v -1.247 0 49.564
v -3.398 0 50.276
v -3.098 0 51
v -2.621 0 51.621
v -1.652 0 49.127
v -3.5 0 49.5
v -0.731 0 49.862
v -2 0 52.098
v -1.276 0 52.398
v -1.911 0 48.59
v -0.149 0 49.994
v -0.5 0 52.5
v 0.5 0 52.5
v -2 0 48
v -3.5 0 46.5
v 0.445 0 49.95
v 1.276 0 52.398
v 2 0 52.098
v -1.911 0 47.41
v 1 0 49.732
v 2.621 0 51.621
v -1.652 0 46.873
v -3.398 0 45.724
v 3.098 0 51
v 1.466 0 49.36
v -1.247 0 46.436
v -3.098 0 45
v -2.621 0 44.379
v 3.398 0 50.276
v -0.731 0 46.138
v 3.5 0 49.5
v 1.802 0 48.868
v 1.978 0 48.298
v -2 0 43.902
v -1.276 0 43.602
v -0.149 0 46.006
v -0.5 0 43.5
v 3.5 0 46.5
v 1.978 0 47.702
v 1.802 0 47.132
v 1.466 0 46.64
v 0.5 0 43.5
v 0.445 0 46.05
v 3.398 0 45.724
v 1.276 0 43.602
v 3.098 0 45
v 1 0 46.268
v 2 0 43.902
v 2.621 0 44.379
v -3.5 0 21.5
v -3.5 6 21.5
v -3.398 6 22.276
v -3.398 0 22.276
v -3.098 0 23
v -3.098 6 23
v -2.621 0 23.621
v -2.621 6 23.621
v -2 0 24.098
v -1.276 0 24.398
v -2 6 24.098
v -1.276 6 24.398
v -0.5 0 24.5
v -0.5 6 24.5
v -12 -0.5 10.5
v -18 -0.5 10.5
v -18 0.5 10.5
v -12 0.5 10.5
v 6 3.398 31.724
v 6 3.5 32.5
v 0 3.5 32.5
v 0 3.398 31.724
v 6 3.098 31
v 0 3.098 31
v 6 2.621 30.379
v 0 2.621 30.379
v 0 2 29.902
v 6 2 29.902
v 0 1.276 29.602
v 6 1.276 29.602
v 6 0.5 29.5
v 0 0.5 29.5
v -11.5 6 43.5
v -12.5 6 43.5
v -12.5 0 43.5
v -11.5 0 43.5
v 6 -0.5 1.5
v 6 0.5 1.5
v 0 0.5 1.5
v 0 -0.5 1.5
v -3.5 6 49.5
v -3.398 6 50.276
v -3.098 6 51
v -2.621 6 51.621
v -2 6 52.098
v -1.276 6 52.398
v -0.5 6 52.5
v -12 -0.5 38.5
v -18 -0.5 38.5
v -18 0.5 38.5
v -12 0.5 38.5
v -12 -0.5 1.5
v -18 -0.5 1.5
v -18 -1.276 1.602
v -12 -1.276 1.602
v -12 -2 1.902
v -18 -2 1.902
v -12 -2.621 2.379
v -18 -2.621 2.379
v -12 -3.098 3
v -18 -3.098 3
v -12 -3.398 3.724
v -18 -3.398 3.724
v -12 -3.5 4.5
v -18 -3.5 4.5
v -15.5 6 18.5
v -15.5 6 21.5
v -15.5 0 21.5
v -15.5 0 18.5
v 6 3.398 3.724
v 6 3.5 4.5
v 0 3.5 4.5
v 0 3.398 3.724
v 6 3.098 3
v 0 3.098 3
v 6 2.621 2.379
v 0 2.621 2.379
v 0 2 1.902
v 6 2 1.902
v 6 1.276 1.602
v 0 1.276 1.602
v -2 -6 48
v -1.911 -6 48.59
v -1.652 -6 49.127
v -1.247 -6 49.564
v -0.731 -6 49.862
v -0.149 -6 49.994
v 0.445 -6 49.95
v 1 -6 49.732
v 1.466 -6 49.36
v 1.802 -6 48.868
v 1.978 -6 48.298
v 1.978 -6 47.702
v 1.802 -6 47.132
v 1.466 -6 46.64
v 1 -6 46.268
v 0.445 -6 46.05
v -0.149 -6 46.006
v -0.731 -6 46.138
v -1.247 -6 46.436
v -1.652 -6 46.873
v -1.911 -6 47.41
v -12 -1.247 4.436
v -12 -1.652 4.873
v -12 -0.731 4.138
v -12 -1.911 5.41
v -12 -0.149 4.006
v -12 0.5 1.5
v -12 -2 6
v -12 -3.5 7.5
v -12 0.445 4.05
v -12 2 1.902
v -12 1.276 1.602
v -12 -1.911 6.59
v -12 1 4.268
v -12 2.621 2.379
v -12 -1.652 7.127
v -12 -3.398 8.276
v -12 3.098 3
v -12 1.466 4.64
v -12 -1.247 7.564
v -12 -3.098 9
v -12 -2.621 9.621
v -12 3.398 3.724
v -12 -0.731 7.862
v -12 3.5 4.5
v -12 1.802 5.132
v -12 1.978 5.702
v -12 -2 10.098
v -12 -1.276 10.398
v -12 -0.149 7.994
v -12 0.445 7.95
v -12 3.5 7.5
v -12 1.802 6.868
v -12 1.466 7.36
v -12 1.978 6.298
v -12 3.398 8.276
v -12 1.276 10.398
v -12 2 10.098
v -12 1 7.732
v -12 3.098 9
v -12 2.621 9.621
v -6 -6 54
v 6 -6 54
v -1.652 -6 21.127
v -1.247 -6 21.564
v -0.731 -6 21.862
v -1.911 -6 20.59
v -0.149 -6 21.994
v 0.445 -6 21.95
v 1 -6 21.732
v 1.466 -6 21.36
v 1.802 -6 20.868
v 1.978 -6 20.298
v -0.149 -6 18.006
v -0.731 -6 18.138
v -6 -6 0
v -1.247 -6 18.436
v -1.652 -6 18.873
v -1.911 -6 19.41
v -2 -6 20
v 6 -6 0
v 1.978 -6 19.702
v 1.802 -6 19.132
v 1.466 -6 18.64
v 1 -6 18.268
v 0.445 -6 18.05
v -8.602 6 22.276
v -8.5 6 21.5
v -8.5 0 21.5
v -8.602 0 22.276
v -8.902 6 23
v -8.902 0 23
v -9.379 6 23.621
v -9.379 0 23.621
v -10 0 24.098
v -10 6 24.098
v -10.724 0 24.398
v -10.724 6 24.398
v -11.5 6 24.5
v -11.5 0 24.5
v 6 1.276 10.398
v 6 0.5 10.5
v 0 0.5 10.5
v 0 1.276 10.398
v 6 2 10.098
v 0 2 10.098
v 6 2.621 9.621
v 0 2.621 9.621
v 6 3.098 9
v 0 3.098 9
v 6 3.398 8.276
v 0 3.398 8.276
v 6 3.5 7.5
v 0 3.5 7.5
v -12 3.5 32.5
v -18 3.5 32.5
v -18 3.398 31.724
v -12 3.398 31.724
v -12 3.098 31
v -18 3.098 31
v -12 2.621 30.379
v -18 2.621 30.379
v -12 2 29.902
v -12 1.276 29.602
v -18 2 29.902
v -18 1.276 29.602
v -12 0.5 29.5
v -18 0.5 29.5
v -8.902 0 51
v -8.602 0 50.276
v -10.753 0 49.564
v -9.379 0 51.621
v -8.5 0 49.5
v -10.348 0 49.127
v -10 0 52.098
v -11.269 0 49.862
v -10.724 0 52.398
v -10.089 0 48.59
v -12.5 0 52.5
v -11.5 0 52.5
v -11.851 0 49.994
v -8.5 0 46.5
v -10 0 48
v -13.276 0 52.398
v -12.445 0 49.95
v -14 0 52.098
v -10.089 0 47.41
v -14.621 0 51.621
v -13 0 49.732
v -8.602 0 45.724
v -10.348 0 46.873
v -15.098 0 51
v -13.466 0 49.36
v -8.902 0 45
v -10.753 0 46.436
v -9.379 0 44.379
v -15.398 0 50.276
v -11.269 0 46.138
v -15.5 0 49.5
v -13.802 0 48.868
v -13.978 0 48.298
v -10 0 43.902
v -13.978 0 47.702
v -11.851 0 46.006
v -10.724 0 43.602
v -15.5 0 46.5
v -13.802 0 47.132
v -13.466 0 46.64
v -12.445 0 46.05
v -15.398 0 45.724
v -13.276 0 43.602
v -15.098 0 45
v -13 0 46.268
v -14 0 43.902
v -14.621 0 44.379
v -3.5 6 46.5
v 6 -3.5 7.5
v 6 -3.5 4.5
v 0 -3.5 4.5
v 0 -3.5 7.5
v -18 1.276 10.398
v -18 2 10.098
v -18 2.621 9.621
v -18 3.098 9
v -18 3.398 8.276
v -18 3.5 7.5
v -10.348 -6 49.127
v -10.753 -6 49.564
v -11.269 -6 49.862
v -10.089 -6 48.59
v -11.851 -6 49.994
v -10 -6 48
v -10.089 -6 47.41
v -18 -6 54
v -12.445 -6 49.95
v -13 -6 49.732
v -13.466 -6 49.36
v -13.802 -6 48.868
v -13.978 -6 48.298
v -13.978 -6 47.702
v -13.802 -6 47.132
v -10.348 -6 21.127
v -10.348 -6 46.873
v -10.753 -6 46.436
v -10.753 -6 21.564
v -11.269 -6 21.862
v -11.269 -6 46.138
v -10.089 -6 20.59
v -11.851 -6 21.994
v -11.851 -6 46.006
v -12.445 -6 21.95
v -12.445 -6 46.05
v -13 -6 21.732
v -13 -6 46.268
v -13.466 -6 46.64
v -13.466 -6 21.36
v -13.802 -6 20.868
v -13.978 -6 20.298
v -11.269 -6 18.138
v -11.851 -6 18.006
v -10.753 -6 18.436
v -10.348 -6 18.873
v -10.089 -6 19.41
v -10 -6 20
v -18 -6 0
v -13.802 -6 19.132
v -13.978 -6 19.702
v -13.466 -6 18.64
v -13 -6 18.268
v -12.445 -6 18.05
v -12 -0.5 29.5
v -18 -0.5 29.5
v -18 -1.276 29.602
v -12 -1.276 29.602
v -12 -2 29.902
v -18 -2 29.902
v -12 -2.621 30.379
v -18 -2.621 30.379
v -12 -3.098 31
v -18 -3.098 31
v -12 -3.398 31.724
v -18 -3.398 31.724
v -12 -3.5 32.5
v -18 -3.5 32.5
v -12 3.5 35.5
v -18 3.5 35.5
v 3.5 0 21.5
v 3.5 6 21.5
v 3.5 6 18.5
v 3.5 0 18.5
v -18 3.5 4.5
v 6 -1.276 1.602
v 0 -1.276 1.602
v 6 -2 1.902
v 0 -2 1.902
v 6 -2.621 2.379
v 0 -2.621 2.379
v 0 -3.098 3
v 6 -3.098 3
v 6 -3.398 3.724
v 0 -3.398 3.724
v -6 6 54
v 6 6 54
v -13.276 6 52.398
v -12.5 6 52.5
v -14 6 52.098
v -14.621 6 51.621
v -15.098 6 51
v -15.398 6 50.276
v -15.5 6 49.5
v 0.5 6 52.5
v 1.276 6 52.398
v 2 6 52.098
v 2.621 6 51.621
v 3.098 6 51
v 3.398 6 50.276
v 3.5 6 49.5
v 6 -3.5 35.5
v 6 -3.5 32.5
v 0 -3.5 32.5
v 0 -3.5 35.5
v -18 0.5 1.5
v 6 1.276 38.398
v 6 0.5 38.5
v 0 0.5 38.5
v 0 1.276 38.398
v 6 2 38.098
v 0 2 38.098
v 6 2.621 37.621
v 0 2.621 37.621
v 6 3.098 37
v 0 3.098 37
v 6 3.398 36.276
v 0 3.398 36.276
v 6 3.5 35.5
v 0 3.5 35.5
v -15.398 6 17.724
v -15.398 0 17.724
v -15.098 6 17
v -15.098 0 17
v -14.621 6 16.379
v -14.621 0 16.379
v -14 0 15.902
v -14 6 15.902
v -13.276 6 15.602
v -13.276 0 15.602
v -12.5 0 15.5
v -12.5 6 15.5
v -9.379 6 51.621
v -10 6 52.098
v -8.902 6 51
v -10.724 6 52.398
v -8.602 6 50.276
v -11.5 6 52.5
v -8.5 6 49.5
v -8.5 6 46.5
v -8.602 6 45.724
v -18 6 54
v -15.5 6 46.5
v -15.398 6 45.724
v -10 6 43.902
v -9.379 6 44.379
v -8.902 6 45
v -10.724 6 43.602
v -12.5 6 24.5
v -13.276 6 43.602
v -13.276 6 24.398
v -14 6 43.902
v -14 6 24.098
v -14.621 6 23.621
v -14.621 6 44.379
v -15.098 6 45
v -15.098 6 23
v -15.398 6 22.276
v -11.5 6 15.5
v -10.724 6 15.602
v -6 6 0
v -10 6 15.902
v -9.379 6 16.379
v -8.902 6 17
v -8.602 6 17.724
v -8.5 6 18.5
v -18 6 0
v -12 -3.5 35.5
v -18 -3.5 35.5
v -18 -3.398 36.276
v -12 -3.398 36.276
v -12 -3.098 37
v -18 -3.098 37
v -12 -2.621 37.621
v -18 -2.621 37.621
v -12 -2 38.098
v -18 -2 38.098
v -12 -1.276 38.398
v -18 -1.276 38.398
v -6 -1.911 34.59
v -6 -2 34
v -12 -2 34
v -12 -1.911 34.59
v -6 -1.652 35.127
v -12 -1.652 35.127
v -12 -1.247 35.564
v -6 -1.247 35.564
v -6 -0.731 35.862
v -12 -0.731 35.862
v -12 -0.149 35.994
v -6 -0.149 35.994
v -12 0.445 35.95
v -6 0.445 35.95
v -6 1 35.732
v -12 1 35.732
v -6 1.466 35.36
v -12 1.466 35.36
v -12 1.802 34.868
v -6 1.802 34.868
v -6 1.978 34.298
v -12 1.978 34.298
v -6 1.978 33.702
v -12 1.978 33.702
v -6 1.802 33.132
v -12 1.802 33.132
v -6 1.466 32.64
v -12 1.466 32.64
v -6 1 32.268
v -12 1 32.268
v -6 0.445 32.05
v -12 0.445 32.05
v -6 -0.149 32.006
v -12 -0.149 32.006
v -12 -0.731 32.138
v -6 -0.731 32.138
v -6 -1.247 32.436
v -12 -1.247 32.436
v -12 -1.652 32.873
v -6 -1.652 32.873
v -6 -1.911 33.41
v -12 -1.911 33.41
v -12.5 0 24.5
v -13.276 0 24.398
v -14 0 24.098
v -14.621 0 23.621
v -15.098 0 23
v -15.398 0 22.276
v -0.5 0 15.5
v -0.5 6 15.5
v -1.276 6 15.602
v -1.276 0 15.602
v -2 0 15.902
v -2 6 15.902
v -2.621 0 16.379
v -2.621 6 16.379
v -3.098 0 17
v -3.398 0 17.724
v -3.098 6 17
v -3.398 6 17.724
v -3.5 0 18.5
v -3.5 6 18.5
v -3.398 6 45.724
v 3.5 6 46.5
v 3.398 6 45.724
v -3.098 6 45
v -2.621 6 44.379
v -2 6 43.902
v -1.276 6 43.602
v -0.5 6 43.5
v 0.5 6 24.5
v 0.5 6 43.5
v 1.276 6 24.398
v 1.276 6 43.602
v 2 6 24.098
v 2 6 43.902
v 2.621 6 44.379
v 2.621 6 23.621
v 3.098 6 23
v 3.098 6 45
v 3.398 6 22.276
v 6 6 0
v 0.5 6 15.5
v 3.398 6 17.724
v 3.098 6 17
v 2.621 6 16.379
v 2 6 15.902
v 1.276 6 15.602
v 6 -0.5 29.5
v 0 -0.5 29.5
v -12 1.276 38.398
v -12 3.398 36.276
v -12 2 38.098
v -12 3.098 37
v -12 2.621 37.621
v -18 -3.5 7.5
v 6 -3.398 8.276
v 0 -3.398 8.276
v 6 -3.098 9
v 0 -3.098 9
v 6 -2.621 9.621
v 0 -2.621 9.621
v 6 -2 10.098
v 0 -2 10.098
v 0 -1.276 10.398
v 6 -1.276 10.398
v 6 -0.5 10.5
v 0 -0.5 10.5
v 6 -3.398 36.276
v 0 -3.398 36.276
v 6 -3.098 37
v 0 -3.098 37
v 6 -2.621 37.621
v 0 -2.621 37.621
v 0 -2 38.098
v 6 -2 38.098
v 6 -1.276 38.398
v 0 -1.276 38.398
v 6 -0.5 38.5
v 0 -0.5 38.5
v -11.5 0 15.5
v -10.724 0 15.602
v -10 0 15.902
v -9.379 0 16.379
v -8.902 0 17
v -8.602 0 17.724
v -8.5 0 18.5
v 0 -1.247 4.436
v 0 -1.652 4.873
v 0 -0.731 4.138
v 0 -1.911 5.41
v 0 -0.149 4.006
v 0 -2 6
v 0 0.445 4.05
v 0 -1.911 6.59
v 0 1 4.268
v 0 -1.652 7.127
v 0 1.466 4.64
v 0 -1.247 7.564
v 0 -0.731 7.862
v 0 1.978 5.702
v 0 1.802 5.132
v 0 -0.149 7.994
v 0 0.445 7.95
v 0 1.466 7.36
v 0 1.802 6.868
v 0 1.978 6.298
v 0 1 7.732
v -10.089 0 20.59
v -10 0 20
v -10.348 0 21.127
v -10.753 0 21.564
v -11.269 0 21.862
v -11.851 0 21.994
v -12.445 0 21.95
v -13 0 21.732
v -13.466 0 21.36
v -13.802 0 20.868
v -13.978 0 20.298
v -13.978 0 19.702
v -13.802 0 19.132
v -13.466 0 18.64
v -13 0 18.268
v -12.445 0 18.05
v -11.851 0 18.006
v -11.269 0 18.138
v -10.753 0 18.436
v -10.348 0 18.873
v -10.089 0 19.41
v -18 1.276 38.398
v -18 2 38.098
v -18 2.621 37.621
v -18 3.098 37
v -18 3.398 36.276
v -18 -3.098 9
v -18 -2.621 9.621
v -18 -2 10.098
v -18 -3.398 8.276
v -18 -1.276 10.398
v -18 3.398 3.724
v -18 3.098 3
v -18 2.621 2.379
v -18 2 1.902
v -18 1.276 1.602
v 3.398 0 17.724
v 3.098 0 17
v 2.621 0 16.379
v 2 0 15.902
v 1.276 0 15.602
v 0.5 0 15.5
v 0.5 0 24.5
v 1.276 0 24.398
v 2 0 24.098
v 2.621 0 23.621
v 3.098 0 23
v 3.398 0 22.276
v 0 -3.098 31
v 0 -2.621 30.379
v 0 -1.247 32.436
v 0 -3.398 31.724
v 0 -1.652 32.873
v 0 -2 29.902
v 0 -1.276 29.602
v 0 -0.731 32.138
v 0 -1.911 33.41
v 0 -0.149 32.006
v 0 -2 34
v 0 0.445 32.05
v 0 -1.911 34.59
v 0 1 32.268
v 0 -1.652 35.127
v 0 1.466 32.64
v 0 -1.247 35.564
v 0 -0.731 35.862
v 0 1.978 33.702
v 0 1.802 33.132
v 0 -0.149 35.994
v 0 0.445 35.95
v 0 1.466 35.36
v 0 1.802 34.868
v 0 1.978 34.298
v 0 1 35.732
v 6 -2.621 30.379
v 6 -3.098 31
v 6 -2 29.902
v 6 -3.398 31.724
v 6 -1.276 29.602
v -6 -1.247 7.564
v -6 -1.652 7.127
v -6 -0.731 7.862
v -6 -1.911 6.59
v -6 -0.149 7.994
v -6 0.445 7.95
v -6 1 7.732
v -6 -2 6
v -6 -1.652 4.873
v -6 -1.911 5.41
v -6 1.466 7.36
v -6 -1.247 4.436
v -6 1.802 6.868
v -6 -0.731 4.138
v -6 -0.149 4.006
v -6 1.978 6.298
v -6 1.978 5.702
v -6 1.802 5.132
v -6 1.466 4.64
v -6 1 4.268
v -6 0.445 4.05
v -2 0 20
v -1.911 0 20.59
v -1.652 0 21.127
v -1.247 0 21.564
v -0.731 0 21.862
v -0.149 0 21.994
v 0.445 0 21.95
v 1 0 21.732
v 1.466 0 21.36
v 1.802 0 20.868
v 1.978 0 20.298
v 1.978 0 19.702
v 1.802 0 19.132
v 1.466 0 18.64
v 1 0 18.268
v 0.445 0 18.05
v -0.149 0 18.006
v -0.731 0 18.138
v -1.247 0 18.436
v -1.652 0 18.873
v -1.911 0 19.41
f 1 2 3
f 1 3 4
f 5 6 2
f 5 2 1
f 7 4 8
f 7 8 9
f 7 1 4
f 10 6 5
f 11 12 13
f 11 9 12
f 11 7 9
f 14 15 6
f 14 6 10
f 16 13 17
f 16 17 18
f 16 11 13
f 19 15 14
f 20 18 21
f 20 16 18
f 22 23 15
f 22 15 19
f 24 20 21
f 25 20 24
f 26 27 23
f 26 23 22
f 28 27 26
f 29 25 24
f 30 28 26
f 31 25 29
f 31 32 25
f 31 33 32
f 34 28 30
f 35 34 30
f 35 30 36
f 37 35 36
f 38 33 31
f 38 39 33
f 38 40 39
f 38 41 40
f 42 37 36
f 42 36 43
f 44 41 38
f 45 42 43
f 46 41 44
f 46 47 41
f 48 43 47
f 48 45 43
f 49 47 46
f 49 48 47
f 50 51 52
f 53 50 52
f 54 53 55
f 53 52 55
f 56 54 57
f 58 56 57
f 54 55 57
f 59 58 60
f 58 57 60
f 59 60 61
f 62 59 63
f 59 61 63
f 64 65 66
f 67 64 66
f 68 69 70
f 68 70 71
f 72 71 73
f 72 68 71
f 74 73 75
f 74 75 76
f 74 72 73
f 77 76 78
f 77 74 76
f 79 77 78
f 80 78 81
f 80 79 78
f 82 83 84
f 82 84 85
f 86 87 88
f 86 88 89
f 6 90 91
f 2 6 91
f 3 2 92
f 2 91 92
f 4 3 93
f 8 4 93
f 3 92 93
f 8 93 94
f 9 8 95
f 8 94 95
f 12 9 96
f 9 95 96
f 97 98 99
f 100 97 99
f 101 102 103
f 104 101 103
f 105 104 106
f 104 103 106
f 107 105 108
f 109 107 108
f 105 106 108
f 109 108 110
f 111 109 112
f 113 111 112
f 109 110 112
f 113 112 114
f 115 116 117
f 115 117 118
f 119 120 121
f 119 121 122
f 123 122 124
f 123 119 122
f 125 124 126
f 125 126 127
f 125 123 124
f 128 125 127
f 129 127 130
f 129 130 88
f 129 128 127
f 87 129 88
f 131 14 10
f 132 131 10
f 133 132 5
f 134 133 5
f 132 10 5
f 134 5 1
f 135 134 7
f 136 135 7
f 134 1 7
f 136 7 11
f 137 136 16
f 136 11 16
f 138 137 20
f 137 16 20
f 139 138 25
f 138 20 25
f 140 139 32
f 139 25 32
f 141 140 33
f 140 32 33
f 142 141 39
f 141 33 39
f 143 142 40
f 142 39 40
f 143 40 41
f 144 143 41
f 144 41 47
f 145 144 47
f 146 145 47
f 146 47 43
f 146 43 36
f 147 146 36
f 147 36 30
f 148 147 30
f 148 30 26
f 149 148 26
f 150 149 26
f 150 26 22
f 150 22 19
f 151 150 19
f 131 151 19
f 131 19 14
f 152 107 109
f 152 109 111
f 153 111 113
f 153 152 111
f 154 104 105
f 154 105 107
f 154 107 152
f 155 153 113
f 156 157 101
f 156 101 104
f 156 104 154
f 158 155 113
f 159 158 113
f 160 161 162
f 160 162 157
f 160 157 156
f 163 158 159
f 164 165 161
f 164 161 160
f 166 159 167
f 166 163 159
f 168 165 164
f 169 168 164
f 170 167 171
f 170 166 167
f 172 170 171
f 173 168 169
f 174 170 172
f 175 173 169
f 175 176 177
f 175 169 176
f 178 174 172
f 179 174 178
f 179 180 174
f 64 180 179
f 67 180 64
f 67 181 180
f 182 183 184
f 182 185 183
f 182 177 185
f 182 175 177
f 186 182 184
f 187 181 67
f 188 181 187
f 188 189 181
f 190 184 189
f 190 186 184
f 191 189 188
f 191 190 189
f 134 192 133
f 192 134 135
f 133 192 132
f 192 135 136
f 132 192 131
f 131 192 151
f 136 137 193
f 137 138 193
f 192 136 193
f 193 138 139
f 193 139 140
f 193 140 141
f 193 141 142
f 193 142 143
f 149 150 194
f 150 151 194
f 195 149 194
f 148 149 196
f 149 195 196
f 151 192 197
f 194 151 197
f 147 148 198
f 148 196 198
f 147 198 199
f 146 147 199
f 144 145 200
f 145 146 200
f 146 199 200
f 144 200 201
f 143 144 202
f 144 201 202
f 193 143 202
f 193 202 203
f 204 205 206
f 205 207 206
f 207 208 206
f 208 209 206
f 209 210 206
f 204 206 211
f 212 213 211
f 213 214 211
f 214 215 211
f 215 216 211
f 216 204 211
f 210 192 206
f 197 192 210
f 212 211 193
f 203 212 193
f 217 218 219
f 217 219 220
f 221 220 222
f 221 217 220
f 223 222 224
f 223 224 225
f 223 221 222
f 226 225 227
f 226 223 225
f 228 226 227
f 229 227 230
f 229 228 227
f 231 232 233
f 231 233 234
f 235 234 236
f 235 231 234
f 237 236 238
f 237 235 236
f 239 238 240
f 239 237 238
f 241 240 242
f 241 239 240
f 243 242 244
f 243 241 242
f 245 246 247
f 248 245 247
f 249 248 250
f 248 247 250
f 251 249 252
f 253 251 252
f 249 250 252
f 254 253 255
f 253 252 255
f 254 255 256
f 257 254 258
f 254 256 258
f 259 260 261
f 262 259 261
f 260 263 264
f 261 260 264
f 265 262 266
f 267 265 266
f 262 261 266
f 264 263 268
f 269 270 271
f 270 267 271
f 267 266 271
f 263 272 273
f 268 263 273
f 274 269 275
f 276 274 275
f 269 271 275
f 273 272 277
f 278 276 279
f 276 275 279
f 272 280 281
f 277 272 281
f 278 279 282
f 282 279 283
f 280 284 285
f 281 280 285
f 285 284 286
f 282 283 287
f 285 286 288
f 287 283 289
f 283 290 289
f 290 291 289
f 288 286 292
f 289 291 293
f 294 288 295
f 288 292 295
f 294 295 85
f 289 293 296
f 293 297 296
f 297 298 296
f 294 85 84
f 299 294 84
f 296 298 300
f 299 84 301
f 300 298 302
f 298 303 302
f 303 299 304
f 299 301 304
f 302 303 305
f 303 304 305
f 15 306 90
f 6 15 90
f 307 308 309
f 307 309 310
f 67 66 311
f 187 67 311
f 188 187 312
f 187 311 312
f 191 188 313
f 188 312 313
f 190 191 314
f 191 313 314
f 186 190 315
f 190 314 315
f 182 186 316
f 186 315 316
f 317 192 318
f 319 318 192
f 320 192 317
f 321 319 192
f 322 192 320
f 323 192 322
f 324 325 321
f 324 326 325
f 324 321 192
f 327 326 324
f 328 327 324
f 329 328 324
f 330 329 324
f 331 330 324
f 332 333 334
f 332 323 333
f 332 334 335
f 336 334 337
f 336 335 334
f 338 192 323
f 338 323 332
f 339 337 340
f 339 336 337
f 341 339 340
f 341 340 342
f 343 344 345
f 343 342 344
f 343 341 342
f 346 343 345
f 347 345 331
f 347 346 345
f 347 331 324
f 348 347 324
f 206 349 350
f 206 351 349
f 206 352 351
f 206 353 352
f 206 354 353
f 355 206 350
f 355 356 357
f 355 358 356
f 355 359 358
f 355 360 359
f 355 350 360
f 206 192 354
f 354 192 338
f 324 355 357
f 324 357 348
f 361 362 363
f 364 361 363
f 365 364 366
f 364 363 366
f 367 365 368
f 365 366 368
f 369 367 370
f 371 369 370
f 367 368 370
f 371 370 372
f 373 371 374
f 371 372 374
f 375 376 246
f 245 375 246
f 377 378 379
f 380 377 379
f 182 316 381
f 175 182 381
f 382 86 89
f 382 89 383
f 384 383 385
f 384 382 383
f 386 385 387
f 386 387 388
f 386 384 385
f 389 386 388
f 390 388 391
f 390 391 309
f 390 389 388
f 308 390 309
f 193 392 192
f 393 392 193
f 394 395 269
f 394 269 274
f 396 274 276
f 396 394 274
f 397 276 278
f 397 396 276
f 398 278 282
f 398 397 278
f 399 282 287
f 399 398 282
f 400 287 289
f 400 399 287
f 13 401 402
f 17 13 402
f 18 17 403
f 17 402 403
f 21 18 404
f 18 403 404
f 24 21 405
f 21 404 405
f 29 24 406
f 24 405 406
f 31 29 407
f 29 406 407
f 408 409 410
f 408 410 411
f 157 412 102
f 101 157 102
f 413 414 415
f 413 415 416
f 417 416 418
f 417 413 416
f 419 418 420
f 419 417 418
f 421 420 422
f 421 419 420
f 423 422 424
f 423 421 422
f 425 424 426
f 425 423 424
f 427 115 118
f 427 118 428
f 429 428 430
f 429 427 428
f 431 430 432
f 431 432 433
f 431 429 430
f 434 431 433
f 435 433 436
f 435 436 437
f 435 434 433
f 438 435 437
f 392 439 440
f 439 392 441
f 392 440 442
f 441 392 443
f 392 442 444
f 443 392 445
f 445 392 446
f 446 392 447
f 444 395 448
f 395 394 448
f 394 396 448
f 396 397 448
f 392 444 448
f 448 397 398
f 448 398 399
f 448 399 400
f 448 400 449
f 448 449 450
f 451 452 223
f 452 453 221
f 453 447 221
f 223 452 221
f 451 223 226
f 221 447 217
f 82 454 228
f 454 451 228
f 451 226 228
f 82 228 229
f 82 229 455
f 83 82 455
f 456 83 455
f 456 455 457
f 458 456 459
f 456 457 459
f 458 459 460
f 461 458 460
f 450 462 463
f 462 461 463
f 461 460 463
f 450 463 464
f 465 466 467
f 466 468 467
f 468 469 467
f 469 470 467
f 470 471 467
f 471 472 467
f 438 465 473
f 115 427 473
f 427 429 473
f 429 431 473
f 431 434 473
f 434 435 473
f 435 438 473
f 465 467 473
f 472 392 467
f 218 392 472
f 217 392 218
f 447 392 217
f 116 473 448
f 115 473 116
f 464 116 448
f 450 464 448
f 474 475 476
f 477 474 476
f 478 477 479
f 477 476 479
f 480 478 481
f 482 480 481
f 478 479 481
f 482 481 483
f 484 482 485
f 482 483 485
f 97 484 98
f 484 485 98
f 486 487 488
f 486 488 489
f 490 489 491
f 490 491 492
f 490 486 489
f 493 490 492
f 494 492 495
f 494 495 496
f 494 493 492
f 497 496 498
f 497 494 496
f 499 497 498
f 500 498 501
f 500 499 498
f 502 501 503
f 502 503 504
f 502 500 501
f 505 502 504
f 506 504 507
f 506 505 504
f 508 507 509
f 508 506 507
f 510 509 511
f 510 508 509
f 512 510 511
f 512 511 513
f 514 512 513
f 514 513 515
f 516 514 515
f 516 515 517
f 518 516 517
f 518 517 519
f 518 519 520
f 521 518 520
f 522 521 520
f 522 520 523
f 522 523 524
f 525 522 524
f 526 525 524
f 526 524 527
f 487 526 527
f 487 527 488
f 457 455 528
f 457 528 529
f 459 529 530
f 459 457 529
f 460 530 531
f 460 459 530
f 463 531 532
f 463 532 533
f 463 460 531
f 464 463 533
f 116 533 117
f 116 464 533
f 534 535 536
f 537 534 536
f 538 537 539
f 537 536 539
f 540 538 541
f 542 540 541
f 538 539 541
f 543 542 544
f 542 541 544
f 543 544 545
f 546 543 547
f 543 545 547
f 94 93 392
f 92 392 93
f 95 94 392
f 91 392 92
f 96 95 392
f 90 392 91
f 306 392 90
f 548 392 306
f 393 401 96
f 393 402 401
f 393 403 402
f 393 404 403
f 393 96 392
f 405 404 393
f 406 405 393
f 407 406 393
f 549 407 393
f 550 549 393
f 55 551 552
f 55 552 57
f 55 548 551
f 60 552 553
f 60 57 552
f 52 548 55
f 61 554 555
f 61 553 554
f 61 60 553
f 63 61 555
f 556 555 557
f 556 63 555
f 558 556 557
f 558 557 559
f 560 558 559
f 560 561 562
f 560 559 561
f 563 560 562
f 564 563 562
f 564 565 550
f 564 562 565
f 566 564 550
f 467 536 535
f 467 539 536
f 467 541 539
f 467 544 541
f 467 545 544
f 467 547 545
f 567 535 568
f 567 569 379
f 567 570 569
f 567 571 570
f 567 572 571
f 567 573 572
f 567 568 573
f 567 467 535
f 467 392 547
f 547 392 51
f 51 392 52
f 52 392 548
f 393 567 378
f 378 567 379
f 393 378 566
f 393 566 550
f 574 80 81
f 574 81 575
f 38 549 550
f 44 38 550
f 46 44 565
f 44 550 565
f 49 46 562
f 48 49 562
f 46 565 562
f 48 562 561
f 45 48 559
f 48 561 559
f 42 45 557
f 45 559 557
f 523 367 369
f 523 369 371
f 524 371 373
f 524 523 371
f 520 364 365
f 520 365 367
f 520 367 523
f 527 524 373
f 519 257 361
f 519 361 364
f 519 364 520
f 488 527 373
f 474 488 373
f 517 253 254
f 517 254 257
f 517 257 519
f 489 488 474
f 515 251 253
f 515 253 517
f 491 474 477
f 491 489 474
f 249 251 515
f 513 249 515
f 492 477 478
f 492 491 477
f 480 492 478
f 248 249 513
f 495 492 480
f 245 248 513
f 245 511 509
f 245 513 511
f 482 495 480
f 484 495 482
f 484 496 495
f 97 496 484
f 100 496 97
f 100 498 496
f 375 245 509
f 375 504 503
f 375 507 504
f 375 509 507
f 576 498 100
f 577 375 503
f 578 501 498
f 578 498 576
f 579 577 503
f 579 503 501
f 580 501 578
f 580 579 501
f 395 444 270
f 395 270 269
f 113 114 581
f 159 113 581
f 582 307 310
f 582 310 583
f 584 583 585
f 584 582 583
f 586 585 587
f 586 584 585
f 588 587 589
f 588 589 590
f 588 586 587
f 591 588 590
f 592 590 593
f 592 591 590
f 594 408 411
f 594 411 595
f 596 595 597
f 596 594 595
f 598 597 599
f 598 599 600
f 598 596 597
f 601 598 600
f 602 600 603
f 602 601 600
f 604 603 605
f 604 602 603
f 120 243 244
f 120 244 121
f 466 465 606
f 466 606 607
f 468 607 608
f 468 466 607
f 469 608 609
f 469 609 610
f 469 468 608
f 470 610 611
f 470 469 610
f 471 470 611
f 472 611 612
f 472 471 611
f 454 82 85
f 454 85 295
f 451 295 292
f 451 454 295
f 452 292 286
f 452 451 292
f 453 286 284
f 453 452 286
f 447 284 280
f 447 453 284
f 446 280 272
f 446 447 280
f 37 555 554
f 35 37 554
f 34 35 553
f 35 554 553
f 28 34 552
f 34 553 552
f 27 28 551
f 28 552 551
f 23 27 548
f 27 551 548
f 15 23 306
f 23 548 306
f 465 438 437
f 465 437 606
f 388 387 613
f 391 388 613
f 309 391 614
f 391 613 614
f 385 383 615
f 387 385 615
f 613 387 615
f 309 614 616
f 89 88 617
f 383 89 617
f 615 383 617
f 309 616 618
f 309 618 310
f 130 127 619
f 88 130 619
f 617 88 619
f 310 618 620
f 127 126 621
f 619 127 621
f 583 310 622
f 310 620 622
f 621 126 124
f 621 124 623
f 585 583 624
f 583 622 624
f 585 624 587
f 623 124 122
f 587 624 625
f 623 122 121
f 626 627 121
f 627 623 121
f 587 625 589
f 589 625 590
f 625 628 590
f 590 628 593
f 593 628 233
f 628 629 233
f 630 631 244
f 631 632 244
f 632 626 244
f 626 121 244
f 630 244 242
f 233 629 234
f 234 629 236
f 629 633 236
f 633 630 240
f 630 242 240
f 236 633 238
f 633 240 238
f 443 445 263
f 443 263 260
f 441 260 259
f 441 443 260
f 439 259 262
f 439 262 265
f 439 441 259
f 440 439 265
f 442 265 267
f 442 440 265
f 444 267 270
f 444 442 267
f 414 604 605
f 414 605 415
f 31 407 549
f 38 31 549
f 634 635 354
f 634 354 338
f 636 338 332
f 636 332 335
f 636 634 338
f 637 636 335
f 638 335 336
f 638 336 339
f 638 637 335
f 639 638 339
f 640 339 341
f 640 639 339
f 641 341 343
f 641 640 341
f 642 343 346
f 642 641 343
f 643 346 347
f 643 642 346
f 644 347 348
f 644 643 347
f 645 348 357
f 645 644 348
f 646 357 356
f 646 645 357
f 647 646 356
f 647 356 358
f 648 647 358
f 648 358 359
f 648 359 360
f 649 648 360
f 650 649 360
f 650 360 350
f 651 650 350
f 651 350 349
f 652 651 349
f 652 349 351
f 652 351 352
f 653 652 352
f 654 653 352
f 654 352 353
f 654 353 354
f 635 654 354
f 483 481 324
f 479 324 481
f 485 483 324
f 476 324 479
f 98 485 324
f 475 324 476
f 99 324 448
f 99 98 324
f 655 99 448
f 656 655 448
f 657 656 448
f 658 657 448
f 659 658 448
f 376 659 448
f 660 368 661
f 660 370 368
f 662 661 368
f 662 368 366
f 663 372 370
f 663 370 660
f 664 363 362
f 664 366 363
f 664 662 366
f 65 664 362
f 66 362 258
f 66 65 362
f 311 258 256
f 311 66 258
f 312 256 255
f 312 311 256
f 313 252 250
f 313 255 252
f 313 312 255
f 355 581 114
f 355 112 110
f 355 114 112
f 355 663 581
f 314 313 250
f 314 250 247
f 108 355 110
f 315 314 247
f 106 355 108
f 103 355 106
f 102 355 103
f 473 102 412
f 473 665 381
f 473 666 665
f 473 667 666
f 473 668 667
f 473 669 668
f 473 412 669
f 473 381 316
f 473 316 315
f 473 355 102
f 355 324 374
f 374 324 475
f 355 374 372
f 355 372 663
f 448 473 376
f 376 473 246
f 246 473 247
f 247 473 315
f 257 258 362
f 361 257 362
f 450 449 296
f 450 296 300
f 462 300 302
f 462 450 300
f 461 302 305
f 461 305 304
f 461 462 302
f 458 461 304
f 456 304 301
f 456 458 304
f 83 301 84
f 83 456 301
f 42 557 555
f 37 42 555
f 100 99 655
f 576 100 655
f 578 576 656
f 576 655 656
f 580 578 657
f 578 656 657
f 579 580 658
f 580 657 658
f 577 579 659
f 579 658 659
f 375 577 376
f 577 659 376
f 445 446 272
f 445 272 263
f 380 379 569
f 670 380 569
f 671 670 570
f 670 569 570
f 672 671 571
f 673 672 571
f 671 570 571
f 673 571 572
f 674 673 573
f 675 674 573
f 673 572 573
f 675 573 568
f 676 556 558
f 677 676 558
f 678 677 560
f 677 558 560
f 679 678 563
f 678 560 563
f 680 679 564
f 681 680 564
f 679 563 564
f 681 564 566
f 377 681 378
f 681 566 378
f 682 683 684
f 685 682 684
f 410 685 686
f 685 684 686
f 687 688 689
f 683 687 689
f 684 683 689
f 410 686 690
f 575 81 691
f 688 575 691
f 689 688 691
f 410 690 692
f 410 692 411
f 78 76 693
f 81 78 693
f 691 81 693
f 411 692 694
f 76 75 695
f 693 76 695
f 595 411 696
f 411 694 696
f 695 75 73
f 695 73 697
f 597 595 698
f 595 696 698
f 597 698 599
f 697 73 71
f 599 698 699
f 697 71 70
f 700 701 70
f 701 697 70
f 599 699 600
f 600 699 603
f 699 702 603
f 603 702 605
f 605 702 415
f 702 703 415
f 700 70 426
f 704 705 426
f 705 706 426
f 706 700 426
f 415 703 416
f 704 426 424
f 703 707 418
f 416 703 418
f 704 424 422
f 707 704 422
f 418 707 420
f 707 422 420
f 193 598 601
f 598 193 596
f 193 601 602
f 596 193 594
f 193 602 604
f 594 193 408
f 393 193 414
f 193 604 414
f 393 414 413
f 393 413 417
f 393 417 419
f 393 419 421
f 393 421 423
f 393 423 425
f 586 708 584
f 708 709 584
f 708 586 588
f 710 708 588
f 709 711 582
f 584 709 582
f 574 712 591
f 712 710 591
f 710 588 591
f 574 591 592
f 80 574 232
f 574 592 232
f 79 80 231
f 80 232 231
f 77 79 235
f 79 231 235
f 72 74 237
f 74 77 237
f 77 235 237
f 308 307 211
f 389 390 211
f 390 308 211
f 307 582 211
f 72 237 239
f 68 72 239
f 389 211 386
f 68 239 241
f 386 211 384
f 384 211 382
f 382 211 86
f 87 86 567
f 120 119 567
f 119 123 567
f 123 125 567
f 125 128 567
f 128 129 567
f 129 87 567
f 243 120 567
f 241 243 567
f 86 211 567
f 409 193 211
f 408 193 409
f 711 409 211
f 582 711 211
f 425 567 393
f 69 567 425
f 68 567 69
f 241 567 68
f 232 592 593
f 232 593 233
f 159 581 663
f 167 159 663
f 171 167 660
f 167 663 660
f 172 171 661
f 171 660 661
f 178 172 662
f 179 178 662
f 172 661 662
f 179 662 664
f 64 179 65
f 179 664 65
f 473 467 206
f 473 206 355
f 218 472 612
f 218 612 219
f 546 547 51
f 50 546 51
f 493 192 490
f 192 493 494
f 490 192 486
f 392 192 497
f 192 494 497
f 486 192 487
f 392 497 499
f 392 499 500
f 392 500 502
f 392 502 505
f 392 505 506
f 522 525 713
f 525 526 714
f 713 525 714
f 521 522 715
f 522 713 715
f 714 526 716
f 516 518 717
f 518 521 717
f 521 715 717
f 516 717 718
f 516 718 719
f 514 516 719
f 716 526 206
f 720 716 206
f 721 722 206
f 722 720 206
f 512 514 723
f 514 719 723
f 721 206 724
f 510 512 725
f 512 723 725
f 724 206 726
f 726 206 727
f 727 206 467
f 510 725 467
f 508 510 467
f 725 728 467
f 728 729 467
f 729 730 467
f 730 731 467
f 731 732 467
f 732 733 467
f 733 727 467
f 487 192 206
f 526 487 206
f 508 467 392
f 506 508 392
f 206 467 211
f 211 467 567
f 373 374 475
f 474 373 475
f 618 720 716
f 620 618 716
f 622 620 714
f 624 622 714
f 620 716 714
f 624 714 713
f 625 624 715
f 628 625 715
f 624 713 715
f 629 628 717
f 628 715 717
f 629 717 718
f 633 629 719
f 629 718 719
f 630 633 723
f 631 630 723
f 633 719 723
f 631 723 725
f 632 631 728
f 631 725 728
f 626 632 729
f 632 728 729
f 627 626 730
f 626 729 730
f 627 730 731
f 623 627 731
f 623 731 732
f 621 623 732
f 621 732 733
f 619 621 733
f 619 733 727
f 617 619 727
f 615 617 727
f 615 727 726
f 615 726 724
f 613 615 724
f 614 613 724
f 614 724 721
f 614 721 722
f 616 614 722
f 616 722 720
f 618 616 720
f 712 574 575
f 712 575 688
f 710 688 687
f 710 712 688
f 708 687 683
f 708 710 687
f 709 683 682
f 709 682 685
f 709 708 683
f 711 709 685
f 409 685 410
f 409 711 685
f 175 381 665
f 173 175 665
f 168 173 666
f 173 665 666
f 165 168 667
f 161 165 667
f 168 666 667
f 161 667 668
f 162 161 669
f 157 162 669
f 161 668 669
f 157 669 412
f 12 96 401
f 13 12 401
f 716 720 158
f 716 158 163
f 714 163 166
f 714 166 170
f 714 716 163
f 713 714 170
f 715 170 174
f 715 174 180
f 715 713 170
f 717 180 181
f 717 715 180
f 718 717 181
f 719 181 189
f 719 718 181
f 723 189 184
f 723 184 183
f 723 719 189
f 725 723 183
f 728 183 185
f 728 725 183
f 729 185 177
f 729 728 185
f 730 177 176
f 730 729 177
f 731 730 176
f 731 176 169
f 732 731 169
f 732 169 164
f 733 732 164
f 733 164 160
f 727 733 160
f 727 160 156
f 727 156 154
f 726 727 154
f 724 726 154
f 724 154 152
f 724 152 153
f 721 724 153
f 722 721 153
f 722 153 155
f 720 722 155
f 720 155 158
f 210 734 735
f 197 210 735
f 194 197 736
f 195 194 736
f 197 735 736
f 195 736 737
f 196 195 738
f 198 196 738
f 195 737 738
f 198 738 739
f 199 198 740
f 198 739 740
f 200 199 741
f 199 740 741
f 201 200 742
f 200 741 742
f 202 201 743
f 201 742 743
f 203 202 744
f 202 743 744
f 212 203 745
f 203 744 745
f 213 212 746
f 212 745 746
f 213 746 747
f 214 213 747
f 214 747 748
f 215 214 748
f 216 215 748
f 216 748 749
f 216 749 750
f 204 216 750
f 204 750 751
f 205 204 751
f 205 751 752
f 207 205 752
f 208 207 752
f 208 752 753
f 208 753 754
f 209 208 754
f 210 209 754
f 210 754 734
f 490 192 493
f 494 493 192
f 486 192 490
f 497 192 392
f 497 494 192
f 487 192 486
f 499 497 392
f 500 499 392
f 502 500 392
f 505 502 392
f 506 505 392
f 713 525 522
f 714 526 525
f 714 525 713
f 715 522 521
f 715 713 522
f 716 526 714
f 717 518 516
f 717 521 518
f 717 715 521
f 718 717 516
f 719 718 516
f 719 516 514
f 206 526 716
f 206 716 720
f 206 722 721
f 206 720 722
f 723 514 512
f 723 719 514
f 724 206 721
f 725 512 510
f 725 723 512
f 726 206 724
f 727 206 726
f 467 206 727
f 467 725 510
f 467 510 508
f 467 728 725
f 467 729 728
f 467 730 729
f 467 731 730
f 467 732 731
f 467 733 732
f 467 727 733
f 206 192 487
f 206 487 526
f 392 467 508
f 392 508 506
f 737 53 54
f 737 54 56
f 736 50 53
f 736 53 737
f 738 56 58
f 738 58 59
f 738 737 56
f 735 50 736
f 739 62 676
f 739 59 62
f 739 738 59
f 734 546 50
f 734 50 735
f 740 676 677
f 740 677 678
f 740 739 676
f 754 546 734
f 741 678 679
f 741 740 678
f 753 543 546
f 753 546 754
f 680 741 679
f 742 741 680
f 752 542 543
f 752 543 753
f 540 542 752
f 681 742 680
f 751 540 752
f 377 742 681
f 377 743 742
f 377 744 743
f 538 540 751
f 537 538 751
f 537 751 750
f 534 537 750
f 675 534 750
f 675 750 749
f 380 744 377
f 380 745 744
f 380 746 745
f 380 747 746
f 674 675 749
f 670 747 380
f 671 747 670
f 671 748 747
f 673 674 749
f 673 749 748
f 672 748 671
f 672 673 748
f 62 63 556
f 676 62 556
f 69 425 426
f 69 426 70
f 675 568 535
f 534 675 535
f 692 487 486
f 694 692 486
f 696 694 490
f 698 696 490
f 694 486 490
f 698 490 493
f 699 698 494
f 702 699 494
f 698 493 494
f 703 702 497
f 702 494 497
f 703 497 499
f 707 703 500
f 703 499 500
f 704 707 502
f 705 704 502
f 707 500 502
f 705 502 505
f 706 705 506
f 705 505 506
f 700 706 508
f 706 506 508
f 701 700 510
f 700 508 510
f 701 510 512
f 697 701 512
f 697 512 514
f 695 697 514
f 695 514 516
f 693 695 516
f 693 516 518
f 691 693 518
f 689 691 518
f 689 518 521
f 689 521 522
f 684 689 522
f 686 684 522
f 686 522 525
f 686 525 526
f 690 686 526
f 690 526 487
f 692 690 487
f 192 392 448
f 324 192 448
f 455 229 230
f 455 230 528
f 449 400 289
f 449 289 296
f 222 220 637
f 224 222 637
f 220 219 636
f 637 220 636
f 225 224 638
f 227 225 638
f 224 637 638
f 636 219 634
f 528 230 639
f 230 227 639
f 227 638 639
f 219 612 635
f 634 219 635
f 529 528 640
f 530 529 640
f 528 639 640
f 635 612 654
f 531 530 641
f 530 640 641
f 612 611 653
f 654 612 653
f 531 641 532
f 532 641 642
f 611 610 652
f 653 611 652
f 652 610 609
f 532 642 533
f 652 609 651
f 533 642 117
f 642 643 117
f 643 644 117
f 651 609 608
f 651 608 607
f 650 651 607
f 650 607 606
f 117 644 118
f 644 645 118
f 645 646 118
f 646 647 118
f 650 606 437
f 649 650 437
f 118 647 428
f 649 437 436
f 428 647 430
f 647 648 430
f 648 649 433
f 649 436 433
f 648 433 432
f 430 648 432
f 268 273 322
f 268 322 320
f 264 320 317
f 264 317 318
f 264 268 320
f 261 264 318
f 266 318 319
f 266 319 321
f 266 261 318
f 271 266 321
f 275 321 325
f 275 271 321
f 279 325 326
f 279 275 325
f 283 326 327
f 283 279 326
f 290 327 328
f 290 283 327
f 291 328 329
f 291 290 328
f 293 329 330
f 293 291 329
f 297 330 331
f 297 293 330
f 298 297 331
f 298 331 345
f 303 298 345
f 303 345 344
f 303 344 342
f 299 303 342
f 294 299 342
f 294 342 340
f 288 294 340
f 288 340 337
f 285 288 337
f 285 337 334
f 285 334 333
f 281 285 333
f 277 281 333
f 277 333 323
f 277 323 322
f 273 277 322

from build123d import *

# Parameters (mm, degrees)
SKETCH1_W           = 12
SKETCH1_H           = 12
BOSS_EXTRUDE1_DEPTH = 54
SKETCH2_R           = 2
CUT_EXTRUDE1_DEPTH  = 14
SKETCH3_R           = 2
CUT_EXTRUDE2_DEPTH  = 14
CUT_EXTRUDE3_DEPTH  = 6
CUT_EXTRUDE4_DEPTH  = 6


with BuildPart() as part:
    # Sketch1 → Boss-Extrude1 (new body)
    with BuildSketch(Plane.XY):
        Rectangle(SKETCH1_W, SKETCH1_H)
    extrude(amount=BOSS_EXTRUDE1_DEPTH)

    # Sketch2 → Cut-Extrude1 (cut)
    with BuildSketch(Plane(origin=(0, 6, 0), x_dir=(1, 0, 0), z_dir=(0, 1, 0))):
        with Locations(Location((0, -20, 0), (0, 0, 180))):
            Circle(SKETCH2_R)
        with Locations(Location((0, -48, 0), (0, 0, 180))):
            Circle(SKETCH2_R)
    extrude(amount=-CUT_EXTRUDE1_DEPTH, mode=Mode.SUBTRACT)

    # Sketch3 → Cut-Extrude2 (cut)
    with BuildSketch(Plane.ZY.offset(6)):
        with Locations(Location((34, 0, 0), (0, 0, 270))):
            Circle(SKETCH3_R)
        with Locations(Location((6, 0, 0), (0, 0, 270))):
            Circle(SKETCH3_R)
    extrude(amount=-CUT_EXTRUDE2_DEPTH, mode=Mode.SUBTRACT)

    # Sketch4 → Cut-Extrude3 (cut)
    with BuildSketch(Plane(origin=(6, 0, 0), x_dir=(0, 0, -1), z_dir=(1, 0, 0))):
        with BuildLine():
            Line((-4.5, -3.5), (-7.5, -3.5))
            ThreePointArc((-7.5, -3.5), (-9.621320344, -2.621320344), (-10.5, -0.5))
            Line((-10.5, -0.5), (-10.5, 0.5))
            ThreePointArc((-10.5, 0.5), (-9.621320344, 2.621320344), (-7.5, 3.5))
            Line((-7.5, 3.5), (-4.5, 3.5))
            ThreePointArc((-4.5, 3.5), (-2.378679656, 2.621320344), (-1.5, 0.5))
            Line((-1.5, 0.5), (-1.5, -0.5))
            ThreePointArc((-1.5, -0.5), (-2.378679656, -2.621320344), (-4.5, -3.5))
        make_face()
        with BuildLine():
            Line((-38.5, -0.5), (-38.5, 0.5))
            ThreePointArc((-38.5, 0.5), (-37.621320344, 2.621320344), (-35.5, 3.5))
            Line((-35.5, 3.5), (-32.5, 3.5))
            ThreePointArc((-32.5, 3.5), (-30.378679656, 2.621320344), (-29.5, 0.5))
            Line((-29.5, 0.5), (-29.5, -0.5))
            ThreePointArc((-29.5, -0.5), (-30.378679656, -2.621320344), (-32.5, -3.5))
            Line((-32.5, -3.5), (-35.5, -3.5))
            ThreePointArc((-35.5, -3.5), (-37.621320344, -2.621320344), (-38.5, -0.5))
        make_face()
    extrude(amount=-CUT_EXTRUDE3_DEPTH, mode=Mode.SUBTRACT)

    # Sketch5 → Cut-Extrude4 (cut)
    with BuildSketch(Plane(origin=(0, 6, 0), x_dir=(1, 0, 0), z_dir=(0, 1, 0))):
        with BuildLine():
            Line((-0.5, -52.5), (0.5, -52.5))
            ThreePointArc((0.5, -52.5), (2.621320344, -51.621320344), (3.5, -49.5))
            Line((3.5, -49.5), (3.5, -46.5))
            ThreePointArc((3.5, -46.5), (2.621320344, -44.378679656), (0.5, -43.5))
            Line((0.5, -43.5), (-0.5, -43.5))
            ThreePointArc((-0.5, -43.5), (-2.621320344, -44.378679656), (-3.5, -46.5))
            Line((-3.5, -46.5), (-3.5, -49.5))
            ThreePointArc((-3.5, -49.5), (-2.621320344, -51.621320344), (-0.5, -52.5))
        make_face()
        with BuildLine():
            Line((-0.5, -24.5), (0.5, -24.5))
            ThreePointArc((0.5, -24.5), (2.621320344, -23.621320344), (3.5, -21.5))
            Line((3.5, -21.5), (3.5, -18.5))
            ThreePointArc((3.5, -18.5), (2.621320344, -16.378679656), (0.5, -15.5))
            Line((0.5, -15.5), (-0.5, -15.5))
            ThreePointArc((-0.5, -15.5), (-2.621320344, -16.378679656), (-3.5, -18.5))
            Line((-3.5, -18.5), (-3.5, -21.5))
            ThreePointArc((-3.5, -21.5), (-2.621320344, -23.621320344), (-0.5, -24.5))
        make_face()
    extrude(amount=-CUT_EXTRUDE4_DEPTH, mode=Mode.SUBTRACT)


with BuildPart() as body_2:
    # Mirror3: mirrored copy
    add(part.part.mirror(Plane(origin=(-6, 6, 54), x_dir=(0, 0, 1), z_dir=(1, 0, 0))))


solid = Compound([part.part, body_2.part])
